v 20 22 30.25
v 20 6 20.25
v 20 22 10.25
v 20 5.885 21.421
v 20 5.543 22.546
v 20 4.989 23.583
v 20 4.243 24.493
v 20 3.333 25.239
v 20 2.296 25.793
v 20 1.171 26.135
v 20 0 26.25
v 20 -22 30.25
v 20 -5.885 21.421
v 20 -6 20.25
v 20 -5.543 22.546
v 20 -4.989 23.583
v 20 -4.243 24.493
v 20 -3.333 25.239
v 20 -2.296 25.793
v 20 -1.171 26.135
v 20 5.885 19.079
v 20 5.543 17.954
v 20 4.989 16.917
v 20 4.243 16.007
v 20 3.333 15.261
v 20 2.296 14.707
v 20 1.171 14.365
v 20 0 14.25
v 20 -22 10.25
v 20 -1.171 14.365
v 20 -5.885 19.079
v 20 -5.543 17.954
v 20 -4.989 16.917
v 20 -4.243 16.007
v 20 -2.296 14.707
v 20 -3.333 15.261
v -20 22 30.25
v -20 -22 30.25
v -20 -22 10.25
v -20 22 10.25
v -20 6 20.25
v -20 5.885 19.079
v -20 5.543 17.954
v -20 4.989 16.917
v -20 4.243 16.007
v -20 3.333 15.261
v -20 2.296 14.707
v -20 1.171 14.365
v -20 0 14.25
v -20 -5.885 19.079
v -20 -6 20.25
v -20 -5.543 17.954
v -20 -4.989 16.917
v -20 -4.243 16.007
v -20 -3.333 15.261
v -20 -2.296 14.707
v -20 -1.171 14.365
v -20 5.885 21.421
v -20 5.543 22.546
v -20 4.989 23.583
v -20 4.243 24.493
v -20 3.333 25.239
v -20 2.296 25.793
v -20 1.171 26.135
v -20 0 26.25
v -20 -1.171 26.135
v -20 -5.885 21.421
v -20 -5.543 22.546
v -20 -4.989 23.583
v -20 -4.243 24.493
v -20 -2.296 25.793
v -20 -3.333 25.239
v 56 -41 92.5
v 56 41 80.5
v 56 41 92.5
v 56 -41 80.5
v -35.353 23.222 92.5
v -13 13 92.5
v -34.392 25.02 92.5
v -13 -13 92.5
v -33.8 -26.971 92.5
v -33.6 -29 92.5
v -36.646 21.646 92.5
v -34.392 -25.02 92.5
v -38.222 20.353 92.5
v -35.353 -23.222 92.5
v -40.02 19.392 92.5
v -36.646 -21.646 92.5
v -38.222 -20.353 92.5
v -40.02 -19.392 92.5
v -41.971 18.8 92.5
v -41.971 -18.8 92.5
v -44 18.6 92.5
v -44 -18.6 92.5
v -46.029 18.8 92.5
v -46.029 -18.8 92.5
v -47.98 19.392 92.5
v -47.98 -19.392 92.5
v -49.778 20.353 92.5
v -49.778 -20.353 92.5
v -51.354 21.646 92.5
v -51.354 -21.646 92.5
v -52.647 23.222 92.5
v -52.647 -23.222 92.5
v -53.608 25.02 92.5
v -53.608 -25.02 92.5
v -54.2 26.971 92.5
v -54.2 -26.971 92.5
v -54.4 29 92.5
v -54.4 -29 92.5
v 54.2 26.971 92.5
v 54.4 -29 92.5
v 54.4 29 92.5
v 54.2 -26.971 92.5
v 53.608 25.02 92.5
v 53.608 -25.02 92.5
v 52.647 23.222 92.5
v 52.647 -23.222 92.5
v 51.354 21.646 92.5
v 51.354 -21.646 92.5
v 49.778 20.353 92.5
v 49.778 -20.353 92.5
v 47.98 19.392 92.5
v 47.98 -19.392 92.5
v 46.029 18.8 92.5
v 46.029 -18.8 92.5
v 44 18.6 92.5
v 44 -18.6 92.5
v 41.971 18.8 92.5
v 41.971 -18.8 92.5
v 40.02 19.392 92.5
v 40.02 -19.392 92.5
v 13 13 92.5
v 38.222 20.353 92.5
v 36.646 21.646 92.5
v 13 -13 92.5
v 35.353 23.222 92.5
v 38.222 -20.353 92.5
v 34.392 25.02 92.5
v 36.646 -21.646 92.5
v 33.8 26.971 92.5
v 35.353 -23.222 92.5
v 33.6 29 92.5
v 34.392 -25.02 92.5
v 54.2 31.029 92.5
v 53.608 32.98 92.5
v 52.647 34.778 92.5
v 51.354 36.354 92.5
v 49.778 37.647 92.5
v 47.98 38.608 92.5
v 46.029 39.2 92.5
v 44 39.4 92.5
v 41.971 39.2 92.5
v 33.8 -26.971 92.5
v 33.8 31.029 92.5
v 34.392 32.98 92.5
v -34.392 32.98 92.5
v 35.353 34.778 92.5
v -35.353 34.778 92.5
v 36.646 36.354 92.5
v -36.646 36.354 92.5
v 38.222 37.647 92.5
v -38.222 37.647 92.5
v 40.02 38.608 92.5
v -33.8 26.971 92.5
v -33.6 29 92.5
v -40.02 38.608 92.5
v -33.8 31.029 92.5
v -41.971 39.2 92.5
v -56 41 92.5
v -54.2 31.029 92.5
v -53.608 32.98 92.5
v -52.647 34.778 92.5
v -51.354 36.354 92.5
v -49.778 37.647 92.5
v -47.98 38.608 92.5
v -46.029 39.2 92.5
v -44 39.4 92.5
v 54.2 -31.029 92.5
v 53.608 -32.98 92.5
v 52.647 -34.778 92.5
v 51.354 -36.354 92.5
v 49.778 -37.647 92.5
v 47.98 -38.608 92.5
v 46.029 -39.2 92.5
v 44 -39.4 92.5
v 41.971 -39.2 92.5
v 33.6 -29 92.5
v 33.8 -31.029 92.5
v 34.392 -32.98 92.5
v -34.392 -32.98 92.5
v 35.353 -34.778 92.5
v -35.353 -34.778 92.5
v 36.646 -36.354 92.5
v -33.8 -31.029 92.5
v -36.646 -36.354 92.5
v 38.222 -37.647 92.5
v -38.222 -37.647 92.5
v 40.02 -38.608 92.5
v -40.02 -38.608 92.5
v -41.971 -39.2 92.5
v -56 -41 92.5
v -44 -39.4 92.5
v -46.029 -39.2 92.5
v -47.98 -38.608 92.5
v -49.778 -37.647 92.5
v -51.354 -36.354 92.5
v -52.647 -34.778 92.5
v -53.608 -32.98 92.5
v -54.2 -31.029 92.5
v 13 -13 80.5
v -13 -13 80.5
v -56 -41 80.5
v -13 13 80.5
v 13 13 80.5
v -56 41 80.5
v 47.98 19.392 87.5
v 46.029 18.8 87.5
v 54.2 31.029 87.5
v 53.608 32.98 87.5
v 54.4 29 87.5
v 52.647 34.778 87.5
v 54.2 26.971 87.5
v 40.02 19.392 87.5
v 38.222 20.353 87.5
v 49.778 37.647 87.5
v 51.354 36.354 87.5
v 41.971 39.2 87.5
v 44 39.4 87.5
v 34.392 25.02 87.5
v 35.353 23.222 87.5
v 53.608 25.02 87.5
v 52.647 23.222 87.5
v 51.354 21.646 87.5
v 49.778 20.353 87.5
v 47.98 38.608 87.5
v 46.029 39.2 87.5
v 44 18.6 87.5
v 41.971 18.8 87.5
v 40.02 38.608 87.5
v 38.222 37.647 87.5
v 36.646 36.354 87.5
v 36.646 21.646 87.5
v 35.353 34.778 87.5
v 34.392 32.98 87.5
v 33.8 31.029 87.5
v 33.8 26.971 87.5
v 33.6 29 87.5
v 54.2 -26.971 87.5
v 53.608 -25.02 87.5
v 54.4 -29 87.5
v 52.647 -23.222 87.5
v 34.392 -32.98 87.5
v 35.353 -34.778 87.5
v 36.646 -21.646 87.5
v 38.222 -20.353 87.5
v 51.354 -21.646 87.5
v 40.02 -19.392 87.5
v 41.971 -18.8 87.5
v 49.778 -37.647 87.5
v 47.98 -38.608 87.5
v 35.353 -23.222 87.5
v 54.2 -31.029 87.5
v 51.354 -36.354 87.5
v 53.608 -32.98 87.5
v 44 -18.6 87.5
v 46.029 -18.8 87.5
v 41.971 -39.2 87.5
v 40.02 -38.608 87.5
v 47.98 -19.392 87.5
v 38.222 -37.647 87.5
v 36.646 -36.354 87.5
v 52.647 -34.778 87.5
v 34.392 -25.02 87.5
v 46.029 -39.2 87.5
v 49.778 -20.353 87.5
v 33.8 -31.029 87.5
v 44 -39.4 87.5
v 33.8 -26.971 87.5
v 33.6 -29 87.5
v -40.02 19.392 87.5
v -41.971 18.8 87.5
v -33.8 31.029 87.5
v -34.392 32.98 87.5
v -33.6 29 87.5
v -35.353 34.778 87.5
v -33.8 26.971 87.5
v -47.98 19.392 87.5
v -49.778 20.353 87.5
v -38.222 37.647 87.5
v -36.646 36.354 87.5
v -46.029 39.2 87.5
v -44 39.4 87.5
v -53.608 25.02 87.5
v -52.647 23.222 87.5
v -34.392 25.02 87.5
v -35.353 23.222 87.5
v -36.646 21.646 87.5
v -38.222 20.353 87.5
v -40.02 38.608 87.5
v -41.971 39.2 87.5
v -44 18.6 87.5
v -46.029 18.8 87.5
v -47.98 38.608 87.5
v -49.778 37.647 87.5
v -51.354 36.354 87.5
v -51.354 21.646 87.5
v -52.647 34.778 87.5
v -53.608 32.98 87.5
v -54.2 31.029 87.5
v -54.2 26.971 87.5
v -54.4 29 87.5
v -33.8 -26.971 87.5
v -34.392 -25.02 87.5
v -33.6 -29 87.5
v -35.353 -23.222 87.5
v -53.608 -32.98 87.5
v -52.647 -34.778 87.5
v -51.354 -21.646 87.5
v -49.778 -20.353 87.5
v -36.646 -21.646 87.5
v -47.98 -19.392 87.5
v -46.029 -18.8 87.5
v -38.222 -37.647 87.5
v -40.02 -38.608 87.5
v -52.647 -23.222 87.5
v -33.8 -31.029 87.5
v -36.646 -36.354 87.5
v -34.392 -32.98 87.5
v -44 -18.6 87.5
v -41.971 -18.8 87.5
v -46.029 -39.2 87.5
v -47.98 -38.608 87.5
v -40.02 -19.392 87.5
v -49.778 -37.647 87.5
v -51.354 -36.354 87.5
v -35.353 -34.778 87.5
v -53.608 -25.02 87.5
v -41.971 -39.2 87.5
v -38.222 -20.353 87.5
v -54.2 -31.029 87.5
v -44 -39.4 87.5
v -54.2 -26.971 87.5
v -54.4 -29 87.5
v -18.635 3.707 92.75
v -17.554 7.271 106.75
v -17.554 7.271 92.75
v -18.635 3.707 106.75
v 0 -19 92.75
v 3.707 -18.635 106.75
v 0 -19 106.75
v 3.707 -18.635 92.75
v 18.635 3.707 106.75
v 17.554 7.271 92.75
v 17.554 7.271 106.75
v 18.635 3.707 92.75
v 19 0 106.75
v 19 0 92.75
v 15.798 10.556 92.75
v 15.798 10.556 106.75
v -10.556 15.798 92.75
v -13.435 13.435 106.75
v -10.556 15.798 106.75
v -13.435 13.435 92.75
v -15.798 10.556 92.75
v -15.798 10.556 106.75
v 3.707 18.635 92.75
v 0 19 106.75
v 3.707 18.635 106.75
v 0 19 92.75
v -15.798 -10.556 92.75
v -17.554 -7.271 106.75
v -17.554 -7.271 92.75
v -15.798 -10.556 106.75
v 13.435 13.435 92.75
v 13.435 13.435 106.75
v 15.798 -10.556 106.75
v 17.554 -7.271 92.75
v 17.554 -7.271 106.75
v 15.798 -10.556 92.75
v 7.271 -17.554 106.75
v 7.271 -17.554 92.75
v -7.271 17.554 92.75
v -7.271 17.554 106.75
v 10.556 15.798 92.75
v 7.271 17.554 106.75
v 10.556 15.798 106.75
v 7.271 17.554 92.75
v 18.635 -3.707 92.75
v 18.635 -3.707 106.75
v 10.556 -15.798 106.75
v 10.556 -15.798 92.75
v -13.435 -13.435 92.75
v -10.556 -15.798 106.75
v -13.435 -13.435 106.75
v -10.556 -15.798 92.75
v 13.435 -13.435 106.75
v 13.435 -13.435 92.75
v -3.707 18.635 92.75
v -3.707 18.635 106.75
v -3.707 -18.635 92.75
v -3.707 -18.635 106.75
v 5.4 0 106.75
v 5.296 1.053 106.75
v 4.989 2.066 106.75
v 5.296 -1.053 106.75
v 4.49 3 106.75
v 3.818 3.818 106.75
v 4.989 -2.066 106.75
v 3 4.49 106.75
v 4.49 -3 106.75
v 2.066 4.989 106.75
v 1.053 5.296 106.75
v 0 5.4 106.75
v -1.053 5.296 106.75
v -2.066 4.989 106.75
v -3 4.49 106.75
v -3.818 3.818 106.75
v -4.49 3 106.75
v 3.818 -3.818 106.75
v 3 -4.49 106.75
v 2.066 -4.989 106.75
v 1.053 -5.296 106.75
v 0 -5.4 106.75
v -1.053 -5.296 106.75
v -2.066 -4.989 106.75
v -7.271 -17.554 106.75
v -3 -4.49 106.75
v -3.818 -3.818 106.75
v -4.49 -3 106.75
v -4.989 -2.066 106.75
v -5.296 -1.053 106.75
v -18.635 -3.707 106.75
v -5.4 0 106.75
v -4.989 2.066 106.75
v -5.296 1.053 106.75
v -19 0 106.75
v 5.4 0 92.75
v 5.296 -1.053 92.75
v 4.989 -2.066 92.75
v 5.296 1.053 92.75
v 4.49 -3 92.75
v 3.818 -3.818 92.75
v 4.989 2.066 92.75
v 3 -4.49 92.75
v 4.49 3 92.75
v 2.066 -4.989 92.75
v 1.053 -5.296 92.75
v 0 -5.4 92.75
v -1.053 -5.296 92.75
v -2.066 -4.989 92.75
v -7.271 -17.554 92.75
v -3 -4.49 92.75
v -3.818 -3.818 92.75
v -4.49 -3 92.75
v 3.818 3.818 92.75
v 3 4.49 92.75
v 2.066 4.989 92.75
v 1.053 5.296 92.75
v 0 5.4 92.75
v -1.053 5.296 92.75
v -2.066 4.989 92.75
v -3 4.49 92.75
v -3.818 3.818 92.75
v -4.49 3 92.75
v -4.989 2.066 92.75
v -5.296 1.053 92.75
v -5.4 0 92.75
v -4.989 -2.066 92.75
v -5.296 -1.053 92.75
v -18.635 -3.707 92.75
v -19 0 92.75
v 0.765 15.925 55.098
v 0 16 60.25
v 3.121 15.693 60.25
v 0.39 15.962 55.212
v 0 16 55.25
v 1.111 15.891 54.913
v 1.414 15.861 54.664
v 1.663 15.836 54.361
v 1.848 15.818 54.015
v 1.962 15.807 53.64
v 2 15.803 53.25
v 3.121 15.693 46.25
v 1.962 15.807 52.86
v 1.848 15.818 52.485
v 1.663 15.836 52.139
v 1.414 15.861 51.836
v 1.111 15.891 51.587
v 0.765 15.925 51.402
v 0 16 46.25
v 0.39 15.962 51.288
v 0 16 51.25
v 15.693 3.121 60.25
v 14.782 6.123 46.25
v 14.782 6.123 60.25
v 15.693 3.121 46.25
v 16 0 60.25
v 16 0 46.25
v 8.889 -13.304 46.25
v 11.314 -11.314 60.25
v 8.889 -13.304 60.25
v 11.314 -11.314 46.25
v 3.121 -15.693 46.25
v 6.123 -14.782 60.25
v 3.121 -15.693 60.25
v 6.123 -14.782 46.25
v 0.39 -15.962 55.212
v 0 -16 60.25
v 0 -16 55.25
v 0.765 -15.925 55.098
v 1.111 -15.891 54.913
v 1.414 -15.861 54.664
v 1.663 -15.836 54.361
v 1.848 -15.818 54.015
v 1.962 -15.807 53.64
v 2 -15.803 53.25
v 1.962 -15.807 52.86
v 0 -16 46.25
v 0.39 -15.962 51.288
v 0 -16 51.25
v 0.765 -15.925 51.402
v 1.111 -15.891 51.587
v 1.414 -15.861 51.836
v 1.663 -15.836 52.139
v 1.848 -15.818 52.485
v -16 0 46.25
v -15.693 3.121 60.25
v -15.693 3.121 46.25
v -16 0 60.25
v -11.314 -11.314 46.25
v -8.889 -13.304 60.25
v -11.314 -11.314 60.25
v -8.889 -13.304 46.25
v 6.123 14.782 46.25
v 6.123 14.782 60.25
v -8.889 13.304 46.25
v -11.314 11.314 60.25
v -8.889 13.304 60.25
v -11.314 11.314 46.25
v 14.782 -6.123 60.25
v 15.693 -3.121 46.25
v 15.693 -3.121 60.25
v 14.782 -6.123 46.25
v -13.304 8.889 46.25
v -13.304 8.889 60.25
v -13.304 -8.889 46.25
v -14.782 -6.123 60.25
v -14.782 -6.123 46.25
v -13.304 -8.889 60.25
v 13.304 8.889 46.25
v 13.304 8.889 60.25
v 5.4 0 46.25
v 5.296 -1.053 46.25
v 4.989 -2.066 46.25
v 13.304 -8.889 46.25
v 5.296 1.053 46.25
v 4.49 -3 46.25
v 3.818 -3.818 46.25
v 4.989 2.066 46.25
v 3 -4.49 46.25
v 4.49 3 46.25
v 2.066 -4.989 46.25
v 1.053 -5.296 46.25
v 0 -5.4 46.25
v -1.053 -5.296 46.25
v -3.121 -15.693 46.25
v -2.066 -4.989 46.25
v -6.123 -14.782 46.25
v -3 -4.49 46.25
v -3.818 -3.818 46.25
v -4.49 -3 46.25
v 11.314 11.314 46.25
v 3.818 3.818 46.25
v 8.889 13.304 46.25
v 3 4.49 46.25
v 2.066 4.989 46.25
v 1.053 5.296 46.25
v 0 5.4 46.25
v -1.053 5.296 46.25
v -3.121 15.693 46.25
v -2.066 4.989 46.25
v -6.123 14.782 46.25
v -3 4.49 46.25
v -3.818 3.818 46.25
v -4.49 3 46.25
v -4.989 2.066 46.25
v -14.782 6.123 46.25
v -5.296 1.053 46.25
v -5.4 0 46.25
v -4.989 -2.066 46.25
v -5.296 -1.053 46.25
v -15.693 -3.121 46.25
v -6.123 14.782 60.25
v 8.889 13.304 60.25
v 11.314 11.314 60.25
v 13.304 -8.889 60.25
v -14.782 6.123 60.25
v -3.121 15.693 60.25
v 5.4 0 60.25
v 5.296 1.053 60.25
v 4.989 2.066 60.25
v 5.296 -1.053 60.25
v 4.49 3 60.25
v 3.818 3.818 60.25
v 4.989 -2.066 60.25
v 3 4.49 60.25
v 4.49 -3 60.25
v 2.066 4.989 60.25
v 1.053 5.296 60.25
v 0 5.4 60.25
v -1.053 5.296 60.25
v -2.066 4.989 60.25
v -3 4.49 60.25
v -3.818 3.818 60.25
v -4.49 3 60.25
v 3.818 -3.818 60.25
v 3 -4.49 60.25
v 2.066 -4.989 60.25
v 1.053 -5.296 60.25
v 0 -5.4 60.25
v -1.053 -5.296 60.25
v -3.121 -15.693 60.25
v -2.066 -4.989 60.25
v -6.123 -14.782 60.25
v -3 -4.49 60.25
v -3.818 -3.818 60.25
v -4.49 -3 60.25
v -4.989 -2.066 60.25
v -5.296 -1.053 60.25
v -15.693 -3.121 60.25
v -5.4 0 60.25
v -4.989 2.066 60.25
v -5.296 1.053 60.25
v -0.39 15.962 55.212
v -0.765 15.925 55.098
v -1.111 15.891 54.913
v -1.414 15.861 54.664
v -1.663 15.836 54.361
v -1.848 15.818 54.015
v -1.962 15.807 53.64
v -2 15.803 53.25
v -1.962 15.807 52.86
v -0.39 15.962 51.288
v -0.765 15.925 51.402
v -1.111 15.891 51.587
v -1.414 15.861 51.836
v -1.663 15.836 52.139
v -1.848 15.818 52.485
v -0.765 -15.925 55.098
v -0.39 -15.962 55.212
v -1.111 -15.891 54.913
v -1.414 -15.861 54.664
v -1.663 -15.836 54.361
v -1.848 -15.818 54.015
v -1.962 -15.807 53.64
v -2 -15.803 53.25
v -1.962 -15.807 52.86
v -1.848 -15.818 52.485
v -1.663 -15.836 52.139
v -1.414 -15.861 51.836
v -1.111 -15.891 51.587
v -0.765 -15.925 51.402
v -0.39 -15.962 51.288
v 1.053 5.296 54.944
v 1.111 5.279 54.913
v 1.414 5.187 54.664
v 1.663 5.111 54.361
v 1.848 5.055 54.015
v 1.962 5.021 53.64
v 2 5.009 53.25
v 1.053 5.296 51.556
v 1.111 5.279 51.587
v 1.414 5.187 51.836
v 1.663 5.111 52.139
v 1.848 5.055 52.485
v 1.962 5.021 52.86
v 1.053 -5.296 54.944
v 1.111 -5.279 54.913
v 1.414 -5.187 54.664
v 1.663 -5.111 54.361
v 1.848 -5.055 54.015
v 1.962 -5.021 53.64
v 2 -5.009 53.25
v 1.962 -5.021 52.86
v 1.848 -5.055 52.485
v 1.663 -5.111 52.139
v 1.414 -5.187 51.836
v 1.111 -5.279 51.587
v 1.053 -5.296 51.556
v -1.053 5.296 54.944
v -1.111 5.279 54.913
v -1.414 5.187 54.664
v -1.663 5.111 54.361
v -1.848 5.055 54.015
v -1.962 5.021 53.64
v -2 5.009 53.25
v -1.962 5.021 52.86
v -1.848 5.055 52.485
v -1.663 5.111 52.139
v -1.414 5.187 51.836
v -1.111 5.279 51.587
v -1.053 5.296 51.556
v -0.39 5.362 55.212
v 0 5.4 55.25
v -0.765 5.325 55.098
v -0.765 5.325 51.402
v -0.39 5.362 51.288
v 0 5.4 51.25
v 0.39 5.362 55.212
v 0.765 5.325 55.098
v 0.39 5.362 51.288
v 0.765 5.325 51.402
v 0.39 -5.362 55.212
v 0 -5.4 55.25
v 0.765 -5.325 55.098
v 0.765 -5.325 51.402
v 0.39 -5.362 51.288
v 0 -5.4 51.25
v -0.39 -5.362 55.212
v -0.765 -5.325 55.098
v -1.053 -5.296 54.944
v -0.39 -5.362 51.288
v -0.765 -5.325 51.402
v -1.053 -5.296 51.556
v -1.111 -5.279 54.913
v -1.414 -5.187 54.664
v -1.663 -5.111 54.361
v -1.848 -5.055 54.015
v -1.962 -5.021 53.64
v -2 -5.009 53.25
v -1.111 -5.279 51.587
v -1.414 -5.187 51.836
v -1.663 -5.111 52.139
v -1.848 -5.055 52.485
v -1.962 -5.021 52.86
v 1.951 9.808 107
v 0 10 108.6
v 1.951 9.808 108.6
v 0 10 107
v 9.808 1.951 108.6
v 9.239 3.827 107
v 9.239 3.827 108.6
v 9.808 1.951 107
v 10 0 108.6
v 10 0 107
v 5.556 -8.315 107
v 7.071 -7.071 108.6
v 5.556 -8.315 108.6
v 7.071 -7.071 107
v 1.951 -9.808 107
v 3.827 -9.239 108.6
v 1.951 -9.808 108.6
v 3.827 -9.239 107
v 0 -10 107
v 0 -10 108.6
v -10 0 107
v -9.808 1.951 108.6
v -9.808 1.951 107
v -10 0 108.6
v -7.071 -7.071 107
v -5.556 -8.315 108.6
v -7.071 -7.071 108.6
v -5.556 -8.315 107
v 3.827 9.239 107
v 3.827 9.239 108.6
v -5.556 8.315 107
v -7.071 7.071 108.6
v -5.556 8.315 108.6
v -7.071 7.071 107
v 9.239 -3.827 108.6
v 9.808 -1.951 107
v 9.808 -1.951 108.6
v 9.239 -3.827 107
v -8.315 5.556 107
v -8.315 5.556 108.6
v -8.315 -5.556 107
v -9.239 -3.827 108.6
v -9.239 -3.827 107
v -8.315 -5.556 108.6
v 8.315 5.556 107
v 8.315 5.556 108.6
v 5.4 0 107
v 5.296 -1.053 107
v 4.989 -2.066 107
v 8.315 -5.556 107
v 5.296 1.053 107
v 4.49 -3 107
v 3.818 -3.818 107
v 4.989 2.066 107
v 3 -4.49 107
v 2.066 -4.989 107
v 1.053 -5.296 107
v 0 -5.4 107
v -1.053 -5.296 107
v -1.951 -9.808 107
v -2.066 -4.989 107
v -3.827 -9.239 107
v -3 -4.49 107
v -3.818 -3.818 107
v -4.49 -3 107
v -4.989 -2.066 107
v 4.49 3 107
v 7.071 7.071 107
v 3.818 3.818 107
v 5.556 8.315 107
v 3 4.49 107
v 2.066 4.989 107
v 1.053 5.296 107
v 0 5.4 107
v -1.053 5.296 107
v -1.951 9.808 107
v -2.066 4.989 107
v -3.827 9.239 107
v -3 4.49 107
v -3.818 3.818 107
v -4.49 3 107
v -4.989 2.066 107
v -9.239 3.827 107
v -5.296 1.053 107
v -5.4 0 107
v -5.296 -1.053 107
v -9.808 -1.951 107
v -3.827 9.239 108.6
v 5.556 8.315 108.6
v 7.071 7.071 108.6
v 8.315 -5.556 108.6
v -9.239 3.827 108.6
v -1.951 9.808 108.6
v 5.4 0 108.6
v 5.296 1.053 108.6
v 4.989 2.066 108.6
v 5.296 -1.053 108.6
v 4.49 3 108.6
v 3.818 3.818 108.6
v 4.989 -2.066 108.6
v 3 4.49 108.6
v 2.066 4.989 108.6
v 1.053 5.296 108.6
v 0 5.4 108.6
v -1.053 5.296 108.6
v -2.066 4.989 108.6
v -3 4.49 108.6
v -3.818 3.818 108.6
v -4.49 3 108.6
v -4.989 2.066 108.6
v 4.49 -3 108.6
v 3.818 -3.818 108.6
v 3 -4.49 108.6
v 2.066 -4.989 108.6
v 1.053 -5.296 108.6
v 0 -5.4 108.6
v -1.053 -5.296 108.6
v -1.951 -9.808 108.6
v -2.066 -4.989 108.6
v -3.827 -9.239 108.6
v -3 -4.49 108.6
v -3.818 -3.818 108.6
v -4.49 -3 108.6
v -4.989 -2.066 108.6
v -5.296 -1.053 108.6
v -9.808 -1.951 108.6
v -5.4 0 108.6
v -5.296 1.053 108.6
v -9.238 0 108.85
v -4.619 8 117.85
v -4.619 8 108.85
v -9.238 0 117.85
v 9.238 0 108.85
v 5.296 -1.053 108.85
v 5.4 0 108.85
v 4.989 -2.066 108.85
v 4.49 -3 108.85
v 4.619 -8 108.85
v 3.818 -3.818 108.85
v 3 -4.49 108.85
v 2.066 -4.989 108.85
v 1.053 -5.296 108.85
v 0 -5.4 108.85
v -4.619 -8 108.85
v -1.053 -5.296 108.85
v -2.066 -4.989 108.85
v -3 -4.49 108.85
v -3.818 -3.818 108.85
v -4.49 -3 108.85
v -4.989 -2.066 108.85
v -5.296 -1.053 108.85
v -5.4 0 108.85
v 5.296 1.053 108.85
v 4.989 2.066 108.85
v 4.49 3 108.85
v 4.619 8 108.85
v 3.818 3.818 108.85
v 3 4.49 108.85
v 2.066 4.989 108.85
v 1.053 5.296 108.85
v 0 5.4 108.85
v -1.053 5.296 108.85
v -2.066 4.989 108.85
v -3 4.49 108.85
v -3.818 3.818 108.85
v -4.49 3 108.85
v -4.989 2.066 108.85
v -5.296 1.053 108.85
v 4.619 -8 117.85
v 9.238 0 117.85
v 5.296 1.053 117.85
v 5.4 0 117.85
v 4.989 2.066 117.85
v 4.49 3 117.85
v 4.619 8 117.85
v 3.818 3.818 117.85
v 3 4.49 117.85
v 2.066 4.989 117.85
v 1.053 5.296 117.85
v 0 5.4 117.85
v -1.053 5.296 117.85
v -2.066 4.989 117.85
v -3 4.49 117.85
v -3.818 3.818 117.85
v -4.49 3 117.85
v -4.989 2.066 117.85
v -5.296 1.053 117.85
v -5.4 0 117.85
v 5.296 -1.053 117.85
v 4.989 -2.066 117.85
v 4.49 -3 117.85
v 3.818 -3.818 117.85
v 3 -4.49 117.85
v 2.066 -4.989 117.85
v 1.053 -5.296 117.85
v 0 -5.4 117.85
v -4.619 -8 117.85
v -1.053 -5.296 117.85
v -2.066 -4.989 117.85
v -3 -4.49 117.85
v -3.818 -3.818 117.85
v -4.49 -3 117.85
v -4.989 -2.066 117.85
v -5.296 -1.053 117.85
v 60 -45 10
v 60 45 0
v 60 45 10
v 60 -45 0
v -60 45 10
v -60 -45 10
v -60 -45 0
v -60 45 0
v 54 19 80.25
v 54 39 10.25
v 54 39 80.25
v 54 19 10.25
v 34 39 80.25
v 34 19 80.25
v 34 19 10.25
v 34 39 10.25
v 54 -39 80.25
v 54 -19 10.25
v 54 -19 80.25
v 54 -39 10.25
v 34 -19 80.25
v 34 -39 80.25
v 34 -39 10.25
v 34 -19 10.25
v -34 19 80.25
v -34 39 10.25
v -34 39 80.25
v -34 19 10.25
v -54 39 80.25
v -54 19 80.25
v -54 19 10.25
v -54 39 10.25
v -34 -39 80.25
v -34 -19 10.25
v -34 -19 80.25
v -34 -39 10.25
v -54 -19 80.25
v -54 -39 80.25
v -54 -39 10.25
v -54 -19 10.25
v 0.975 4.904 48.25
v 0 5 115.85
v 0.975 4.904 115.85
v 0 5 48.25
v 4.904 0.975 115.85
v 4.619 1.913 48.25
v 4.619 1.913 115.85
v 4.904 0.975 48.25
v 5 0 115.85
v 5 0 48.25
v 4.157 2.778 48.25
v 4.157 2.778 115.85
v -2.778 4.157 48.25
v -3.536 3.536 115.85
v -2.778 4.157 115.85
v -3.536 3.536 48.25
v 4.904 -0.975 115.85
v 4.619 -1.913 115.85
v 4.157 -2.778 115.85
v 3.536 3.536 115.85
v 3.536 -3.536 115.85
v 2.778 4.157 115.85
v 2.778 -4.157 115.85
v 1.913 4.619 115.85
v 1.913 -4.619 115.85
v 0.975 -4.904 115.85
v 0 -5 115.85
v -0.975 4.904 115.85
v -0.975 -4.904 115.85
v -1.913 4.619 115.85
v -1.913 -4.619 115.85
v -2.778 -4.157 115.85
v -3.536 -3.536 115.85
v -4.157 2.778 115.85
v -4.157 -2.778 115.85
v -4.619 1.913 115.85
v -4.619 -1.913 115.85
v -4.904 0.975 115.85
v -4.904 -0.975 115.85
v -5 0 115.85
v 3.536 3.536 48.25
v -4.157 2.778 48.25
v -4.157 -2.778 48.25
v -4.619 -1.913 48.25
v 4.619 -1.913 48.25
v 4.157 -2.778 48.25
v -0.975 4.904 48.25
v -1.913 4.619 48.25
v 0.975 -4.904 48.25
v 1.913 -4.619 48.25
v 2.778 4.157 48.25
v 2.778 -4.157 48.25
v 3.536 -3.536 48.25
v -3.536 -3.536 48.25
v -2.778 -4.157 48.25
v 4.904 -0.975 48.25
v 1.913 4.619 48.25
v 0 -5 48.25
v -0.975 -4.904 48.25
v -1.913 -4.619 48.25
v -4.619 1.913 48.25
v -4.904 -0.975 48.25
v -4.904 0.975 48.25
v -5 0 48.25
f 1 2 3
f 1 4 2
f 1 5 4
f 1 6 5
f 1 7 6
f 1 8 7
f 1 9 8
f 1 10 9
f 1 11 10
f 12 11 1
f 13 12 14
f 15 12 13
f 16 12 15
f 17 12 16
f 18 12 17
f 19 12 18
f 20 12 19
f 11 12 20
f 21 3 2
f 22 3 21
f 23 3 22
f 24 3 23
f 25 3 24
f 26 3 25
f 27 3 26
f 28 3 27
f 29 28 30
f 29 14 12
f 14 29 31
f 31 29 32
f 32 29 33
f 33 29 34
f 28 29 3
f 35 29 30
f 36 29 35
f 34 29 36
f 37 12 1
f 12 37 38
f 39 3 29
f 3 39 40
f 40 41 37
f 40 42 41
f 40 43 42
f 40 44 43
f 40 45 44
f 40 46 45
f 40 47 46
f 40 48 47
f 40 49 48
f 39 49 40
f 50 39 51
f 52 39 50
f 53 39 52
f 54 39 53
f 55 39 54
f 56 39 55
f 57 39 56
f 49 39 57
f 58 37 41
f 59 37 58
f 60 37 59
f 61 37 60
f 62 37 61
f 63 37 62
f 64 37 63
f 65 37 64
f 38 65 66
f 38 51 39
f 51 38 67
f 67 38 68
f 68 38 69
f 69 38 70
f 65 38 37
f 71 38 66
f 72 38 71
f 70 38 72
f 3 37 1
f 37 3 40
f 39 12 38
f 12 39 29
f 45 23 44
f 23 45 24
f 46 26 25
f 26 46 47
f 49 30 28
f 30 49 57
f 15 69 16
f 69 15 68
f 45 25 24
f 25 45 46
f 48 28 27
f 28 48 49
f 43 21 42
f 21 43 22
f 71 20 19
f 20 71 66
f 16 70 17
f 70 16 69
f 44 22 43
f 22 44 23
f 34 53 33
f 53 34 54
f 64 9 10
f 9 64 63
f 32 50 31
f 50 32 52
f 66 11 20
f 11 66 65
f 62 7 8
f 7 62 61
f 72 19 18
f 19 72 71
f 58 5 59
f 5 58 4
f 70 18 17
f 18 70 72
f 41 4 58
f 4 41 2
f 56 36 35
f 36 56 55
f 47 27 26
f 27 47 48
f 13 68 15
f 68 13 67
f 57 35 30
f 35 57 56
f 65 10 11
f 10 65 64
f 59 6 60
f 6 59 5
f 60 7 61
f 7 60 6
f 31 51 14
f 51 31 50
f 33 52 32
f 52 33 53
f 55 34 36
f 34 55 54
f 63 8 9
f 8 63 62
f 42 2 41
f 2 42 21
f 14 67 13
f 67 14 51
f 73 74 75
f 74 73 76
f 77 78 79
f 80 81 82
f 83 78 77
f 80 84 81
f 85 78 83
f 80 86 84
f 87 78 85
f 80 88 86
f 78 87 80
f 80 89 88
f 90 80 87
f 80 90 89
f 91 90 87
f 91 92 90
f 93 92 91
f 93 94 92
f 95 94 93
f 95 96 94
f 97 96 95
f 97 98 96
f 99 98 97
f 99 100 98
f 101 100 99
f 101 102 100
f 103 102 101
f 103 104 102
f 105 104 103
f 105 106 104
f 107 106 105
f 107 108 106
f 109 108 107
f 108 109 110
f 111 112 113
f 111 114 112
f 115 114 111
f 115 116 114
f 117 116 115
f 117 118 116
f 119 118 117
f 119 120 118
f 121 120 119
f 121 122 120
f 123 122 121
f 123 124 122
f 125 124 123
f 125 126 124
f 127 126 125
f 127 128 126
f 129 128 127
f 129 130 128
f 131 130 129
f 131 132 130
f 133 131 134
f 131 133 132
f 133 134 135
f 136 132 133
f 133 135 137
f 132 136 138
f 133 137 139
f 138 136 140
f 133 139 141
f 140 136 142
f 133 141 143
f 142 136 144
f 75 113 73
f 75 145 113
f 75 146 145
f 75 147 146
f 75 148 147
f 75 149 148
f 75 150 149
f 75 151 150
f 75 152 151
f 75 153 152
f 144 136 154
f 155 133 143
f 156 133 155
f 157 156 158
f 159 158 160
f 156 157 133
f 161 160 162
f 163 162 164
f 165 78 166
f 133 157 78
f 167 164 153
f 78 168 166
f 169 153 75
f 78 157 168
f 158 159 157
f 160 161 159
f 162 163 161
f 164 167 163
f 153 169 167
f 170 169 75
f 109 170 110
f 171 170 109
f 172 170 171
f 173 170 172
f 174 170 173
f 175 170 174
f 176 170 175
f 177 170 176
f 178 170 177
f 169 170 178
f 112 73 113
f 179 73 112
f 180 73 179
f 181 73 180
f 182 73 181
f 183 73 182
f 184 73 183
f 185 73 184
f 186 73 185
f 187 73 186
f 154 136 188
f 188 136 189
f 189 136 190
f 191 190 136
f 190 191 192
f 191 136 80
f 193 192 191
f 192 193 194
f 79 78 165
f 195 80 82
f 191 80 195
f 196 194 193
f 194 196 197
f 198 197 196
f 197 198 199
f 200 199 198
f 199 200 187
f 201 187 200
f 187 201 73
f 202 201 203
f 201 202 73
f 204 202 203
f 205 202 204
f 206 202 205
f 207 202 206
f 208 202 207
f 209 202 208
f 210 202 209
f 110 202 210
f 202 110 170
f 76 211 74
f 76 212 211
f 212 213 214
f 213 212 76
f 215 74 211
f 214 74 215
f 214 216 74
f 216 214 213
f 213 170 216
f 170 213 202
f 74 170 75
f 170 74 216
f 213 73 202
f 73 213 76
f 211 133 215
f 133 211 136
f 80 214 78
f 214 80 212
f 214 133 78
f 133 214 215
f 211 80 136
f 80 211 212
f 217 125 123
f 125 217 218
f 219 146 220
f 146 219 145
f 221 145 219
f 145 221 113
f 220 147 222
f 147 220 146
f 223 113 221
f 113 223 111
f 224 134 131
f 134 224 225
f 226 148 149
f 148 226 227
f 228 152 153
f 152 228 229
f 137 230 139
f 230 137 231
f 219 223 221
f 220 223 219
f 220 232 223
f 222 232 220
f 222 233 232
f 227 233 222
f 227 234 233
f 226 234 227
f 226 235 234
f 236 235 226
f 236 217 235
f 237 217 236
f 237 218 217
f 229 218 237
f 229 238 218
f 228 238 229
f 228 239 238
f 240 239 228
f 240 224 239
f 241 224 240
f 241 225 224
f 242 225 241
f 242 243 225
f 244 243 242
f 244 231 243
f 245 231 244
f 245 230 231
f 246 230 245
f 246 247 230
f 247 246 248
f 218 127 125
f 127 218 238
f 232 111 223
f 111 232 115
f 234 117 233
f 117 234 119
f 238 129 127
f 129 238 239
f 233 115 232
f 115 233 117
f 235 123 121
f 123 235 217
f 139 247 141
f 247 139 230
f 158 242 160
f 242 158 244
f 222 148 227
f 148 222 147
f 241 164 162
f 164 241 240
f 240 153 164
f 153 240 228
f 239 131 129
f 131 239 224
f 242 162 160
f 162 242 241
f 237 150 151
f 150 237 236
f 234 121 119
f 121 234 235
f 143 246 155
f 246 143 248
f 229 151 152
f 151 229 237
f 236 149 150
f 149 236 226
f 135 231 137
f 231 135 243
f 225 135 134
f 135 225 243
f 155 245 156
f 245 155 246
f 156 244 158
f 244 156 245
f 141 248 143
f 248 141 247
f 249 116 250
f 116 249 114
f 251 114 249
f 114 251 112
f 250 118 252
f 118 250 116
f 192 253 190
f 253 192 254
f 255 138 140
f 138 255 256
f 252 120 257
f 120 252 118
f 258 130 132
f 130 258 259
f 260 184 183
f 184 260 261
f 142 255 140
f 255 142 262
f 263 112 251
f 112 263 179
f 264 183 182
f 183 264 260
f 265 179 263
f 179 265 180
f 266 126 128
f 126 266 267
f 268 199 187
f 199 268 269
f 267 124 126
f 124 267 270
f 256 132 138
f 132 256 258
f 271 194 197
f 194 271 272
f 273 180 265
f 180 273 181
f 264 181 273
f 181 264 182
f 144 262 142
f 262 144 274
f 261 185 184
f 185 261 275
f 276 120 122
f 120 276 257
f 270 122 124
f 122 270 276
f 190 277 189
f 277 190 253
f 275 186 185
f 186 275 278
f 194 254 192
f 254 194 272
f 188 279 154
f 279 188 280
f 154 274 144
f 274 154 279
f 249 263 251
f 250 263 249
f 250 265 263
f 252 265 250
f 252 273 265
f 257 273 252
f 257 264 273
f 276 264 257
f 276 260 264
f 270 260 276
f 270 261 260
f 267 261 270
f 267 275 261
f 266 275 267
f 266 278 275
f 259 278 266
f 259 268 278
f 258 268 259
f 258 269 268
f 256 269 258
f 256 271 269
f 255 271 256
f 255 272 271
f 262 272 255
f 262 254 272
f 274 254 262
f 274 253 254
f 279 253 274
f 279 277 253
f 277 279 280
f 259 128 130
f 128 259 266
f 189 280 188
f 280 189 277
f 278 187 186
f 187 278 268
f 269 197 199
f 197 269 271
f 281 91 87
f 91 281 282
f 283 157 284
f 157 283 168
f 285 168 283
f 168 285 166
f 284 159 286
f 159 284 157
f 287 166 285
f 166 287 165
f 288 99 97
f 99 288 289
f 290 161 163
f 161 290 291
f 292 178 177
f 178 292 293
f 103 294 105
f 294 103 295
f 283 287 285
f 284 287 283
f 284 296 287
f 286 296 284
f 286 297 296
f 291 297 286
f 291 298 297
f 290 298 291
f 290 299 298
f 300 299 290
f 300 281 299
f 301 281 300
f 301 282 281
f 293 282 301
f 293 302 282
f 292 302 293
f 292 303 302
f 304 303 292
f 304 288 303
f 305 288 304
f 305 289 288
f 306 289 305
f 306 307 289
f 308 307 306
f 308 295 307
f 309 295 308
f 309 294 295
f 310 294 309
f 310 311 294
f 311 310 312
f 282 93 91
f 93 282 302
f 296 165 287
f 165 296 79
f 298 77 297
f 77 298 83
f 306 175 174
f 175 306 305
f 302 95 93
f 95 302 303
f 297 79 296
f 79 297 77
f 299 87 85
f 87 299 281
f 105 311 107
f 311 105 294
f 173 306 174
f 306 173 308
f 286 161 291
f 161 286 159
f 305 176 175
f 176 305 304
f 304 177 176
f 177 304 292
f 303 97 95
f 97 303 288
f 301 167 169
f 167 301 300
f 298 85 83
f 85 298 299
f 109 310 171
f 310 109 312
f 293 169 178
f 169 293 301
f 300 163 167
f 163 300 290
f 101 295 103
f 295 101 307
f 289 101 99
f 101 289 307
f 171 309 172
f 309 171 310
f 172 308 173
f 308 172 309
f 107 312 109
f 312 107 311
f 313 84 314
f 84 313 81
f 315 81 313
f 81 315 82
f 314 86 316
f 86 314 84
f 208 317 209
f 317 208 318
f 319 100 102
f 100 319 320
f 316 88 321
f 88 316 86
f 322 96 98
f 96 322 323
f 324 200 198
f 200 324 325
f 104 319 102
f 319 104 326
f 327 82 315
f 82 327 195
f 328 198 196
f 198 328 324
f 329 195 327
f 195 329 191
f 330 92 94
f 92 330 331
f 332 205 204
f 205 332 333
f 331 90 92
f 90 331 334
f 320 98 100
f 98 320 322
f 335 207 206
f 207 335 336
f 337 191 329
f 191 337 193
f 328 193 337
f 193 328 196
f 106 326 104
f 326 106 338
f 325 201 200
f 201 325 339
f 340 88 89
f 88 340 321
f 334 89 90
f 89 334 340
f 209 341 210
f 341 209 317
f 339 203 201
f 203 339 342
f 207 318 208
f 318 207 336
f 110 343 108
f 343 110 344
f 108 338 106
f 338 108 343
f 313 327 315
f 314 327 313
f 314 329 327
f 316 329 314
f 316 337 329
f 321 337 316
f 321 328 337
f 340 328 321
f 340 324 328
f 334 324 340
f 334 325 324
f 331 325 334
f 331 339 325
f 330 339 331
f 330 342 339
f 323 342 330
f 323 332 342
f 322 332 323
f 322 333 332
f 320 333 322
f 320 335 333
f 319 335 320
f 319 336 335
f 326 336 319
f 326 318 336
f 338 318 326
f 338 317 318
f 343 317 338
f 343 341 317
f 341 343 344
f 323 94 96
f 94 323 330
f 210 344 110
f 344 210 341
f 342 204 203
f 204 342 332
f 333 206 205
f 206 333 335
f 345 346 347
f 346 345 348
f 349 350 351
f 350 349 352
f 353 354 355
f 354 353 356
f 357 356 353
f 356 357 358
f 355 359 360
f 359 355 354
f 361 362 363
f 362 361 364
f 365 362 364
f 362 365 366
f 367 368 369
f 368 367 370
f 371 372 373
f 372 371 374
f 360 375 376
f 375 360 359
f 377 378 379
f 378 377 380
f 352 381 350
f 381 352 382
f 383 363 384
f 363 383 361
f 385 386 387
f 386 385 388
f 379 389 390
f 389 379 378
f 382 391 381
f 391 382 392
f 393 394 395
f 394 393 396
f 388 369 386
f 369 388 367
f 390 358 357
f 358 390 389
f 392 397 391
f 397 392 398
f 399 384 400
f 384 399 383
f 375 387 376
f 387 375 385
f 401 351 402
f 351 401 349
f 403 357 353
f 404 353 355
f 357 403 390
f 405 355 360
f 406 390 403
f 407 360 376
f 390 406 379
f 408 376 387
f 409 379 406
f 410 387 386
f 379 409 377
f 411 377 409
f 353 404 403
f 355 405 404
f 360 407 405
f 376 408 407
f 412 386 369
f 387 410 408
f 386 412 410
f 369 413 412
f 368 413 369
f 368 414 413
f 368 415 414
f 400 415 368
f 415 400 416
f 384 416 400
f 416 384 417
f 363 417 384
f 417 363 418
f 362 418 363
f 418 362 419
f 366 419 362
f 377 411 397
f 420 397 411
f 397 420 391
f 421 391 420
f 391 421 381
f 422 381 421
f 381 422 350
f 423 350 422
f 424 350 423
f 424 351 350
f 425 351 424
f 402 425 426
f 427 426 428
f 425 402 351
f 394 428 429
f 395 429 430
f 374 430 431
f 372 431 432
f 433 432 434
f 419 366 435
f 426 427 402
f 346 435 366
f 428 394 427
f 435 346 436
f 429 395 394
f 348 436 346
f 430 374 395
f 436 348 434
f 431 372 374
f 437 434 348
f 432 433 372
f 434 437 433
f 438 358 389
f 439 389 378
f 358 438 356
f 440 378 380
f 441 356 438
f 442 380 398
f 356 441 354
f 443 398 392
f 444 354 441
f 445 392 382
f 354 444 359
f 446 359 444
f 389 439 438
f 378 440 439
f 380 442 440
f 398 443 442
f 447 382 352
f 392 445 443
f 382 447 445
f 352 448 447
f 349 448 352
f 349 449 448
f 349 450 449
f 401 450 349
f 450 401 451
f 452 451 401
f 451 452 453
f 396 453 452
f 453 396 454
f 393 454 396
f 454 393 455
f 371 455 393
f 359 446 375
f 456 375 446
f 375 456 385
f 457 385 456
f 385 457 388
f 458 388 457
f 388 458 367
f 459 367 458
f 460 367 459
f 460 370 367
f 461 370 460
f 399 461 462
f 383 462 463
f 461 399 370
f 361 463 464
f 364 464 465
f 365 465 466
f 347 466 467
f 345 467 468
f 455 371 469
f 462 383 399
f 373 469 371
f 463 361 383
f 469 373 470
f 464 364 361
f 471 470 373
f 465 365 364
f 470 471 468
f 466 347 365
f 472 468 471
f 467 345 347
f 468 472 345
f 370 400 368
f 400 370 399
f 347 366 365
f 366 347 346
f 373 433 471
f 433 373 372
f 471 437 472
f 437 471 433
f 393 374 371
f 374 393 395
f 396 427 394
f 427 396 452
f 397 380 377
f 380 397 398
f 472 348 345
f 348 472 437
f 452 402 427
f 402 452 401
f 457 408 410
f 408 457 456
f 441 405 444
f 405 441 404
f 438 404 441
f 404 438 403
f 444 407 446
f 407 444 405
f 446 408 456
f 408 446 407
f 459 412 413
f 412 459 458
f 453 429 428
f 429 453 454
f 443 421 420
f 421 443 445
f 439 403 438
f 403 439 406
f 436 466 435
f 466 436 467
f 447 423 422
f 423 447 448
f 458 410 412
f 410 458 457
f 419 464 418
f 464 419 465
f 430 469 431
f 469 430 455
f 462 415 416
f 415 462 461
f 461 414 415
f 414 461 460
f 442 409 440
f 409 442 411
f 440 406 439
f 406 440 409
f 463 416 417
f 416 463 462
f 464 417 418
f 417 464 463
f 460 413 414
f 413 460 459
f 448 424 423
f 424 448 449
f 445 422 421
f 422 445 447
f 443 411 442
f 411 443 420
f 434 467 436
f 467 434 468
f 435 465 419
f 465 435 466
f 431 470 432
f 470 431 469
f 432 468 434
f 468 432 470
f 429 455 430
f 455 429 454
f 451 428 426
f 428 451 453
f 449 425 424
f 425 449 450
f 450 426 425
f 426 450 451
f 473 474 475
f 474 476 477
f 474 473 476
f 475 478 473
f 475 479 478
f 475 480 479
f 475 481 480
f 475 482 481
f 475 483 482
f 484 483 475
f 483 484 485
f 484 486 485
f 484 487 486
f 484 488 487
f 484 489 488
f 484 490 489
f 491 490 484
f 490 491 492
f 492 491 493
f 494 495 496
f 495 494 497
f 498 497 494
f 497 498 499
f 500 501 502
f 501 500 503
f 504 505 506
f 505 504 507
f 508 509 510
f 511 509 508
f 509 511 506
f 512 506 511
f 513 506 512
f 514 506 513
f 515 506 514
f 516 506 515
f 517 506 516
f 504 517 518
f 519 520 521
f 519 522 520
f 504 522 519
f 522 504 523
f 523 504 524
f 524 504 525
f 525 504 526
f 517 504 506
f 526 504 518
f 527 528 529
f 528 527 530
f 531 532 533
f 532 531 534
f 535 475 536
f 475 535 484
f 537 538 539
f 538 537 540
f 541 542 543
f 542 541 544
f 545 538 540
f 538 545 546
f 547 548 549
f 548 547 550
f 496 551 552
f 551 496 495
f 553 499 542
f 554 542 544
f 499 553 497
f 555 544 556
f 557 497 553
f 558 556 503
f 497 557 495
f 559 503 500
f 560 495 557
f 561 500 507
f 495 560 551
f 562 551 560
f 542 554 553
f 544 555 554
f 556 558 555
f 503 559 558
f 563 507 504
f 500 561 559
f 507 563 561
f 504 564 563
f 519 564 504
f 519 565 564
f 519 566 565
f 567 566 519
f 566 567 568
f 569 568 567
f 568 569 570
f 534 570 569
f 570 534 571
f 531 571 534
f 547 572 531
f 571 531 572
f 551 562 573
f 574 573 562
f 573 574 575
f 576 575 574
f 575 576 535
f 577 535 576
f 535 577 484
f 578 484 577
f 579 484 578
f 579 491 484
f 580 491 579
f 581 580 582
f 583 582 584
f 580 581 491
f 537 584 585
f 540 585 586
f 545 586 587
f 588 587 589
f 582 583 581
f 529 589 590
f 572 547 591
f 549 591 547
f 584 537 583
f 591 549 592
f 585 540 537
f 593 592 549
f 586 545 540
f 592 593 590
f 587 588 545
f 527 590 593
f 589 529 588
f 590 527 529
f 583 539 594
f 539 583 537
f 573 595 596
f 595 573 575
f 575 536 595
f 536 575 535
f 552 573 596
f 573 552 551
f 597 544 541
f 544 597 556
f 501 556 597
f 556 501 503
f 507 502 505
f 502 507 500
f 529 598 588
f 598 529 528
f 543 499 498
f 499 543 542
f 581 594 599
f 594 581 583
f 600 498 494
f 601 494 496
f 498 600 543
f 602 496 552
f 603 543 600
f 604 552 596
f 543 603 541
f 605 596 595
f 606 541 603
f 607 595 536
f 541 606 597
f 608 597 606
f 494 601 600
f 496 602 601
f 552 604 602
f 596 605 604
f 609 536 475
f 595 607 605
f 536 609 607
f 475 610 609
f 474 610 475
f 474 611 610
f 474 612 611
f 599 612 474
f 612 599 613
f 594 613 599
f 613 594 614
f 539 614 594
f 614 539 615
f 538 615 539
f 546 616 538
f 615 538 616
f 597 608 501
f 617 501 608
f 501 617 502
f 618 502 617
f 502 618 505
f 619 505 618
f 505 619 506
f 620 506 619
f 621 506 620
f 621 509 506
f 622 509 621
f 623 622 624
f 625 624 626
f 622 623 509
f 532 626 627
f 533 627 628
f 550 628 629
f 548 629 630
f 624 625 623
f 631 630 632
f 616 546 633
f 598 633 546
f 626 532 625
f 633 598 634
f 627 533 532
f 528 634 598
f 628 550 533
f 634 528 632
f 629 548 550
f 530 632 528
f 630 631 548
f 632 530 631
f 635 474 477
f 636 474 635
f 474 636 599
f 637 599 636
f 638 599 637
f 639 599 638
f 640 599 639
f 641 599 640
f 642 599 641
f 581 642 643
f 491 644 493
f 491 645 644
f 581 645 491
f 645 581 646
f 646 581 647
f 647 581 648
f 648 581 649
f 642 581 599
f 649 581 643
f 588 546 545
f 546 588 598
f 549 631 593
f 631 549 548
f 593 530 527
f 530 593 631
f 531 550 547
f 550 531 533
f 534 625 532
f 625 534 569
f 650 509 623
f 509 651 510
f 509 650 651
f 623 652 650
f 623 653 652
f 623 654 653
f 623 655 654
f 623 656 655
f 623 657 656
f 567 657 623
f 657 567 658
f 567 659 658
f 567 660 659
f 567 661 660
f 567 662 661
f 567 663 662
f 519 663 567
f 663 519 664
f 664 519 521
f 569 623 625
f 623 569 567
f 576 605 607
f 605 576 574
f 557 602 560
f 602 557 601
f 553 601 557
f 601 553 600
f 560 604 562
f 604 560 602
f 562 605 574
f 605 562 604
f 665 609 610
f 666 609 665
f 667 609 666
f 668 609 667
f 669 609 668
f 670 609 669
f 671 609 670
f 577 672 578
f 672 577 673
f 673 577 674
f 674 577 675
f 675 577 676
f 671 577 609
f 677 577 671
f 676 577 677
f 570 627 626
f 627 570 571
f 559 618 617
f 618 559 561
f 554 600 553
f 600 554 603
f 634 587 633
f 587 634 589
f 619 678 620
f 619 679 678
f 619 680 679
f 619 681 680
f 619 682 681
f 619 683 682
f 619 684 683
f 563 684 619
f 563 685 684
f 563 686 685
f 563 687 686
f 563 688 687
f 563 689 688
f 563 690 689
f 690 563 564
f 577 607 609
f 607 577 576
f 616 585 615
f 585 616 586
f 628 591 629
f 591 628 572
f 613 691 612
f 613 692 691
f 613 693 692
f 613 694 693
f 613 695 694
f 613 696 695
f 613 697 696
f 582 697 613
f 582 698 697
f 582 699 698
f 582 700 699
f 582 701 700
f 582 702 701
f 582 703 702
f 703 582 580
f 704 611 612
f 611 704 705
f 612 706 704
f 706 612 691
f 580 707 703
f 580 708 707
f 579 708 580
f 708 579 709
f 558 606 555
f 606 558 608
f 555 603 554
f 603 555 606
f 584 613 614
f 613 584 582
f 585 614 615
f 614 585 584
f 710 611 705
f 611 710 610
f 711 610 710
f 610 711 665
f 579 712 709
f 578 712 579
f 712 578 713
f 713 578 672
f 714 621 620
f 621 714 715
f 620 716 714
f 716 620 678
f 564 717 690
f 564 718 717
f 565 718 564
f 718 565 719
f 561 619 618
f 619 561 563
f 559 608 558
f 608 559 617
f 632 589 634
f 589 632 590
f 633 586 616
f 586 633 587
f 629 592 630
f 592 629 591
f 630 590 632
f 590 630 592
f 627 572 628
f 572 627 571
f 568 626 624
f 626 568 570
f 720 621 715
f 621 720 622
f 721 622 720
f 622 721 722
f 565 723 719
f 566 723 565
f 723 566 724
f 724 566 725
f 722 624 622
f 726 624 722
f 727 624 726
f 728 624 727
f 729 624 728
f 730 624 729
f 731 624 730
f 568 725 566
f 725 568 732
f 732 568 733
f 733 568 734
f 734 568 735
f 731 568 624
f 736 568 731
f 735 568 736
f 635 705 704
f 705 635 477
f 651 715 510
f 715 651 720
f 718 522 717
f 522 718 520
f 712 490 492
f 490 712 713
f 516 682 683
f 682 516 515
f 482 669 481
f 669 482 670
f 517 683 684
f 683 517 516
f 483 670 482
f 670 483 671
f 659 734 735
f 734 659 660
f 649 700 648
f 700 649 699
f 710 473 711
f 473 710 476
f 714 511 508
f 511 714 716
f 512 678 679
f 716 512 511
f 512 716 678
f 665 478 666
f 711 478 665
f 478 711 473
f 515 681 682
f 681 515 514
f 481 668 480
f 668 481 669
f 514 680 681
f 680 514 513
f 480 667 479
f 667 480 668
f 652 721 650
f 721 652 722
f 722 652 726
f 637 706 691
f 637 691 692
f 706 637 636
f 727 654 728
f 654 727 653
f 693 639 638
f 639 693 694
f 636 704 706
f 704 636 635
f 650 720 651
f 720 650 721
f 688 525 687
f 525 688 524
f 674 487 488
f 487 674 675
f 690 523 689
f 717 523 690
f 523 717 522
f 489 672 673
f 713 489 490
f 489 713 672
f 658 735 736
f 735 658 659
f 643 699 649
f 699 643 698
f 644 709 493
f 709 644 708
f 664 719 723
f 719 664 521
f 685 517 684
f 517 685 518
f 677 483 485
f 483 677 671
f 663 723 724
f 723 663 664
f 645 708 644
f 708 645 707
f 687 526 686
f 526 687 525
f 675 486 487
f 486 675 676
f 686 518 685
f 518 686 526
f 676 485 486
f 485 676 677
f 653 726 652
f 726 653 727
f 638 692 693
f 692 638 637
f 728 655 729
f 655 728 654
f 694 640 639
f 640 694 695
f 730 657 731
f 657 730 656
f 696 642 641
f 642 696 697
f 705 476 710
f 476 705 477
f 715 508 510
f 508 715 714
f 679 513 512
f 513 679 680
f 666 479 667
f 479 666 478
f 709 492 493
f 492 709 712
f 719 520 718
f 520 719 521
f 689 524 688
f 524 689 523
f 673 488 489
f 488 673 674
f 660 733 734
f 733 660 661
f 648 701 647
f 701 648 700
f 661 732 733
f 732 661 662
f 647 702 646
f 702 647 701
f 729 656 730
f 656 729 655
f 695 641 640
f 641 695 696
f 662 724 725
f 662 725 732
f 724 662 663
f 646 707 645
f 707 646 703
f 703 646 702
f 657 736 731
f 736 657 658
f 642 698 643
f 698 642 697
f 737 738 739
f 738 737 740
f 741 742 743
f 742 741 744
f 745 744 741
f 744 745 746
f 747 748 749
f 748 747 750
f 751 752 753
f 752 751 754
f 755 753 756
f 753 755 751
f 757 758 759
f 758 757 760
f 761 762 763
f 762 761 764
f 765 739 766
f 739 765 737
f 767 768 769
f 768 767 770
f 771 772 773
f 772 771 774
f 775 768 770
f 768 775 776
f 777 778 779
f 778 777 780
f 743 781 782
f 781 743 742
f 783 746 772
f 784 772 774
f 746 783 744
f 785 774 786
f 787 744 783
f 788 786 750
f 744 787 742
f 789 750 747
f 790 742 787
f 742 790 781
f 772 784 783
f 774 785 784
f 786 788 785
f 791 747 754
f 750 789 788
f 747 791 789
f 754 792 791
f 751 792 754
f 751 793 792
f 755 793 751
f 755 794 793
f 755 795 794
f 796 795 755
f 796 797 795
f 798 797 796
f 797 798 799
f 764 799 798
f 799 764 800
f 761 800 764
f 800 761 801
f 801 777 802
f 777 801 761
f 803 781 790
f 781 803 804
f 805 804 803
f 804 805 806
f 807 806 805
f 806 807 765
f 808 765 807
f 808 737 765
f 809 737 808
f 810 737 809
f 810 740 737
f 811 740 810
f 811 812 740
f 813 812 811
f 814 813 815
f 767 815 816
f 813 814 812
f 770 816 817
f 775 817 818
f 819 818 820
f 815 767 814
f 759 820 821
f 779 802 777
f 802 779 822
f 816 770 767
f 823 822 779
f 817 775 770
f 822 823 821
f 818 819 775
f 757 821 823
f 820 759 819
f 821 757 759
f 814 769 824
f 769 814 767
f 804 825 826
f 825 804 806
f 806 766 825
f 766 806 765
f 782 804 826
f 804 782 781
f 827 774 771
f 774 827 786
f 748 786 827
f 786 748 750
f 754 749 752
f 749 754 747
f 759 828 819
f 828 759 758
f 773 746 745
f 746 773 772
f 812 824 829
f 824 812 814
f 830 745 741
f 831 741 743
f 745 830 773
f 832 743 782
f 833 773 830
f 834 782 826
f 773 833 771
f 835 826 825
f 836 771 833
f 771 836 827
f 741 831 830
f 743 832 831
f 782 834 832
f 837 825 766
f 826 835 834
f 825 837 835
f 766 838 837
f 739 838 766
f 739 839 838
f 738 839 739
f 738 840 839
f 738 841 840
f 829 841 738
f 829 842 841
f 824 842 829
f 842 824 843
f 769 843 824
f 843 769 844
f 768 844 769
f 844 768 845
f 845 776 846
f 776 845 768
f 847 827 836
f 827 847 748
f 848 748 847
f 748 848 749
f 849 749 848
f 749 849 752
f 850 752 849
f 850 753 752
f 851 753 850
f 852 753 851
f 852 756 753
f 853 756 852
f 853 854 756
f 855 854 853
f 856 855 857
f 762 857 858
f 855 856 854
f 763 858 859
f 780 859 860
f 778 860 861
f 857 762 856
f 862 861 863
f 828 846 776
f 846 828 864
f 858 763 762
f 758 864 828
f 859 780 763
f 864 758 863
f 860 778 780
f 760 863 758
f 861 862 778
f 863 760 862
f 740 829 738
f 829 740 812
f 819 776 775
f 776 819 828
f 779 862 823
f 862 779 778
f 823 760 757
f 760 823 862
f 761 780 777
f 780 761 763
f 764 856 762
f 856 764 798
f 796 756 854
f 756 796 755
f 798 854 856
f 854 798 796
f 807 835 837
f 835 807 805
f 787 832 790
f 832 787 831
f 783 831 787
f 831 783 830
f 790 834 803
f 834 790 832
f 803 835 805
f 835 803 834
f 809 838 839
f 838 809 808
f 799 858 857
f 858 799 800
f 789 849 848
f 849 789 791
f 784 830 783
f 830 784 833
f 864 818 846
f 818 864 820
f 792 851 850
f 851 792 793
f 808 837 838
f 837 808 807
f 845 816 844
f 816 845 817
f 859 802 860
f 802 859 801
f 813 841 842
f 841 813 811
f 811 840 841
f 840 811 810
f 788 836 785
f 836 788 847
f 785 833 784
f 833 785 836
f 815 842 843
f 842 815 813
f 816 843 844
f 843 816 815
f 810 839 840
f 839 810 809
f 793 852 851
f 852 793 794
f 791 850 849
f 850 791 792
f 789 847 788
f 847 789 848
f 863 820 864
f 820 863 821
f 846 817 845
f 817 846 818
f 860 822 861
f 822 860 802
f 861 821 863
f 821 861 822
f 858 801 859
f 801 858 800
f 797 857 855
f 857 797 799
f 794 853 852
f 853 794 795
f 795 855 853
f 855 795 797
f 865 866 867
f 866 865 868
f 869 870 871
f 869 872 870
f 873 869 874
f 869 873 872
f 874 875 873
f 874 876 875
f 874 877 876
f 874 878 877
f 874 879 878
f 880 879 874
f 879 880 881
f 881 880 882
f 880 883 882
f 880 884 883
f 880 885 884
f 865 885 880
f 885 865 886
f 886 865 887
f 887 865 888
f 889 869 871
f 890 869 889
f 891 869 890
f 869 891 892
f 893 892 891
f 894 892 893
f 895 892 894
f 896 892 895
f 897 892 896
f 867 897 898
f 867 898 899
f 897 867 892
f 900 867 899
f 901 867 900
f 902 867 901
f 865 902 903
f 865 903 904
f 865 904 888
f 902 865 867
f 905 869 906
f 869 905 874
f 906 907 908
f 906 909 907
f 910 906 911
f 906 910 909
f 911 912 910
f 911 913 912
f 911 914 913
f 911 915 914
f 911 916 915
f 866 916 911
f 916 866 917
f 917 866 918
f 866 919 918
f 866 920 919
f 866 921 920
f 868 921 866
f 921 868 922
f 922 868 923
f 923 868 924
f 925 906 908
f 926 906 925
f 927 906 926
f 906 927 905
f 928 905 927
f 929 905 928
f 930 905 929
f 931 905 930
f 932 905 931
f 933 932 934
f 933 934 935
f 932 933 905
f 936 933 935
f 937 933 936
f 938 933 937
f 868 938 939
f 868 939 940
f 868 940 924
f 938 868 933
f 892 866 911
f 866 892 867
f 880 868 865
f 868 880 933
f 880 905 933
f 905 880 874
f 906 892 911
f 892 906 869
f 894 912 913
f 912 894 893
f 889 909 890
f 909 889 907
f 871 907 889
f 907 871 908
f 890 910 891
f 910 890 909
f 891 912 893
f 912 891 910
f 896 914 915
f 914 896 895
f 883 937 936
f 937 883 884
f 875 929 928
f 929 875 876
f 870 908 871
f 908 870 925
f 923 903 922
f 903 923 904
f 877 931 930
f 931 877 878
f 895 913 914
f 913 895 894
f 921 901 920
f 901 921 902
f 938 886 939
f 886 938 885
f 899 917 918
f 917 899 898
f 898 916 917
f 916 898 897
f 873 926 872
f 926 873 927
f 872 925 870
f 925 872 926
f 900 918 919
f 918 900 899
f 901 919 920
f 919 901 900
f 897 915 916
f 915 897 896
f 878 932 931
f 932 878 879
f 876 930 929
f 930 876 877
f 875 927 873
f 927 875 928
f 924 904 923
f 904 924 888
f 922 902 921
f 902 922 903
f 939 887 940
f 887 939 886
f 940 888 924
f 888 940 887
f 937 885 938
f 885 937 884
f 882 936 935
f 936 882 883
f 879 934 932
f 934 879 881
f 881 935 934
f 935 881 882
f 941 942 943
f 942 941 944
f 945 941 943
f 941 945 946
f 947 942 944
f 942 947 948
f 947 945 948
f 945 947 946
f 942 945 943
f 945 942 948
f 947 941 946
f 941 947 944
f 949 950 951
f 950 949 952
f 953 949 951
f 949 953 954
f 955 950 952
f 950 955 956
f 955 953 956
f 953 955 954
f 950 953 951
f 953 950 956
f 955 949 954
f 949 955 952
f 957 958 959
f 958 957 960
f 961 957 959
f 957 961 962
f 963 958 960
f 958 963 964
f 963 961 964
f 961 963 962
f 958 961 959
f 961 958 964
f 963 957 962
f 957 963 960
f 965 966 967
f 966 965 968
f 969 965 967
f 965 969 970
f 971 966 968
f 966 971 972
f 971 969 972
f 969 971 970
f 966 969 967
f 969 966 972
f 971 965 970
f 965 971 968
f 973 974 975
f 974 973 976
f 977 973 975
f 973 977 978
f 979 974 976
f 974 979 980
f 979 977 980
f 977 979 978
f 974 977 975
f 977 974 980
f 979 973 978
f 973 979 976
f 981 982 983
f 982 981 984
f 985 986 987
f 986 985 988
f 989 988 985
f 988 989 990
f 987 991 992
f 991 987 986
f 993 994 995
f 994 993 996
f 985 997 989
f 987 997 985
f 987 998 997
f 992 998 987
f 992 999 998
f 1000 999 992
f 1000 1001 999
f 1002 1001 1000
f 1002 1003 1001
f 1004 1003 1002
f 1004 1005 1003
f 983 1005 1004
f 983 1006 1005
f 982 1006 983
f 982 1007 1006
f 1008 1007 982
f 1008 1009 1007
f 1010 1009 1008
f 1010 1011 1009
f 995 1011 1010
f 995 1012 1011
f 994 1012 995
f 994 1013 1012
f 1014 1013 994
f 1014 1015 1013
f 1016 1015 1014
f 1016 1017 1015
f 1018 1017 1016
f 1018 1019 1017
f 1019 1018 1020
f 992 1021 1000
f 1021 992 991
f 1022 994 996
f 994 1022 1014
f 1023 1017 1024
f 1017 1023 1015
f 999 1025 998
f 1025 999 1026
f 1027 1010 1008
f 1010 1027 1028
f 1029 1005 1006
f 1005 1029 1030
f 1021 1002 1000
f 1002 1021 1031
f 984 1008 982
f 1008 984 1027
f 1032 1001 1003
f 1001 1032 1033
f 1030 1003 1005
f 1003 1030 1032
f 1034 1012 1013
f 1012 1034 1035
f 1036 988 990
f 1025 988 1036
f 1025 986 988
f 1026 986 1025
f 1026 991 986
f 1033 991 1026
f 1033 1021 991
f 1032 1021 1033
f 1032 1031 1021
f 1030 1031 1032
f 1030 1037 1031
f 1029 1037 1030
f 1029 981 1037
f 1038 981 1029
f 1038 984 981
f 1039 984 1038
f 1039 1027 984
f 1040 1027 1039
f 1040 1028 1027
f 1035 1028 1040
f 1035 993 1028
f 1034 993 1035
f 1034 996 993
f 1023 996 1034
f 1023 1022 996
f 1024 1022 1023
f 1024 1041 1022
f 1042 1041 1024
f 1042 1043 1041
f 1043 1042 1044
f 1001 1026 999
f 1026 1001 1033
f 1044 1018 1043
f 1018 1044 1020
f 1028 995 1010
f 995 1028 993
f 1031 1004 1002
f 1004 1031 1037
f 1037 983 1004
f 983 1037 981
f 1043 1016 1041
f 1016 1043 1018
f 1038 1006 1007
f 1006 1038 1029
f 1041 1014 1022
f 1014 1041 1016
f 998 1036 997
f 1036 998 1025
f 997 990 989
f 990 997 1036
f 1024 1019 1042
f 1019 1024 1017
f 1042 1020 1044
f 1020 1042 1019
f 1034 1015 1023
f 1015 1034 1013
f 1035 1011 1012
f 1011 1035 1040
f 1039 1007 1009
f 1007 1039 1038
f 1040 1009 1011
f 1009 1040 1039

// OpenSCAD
$fn = 32;

// ------------------------------------------------------------------------
// Arbor press fixture: screw d10, posts 70 mm, gap 16 mm
// Every part is its own module, assembly() places every instance.
// ------------------------------------------------------------------------

// --- part 1 ---
module press_bed() {
  difference() {
    translate([-60, -45, 0]) cube([120, 90, 10]);
  }
}

// --- part 2 ---
module anvil_block() {
  difference() {
    translate([-20, -22, 0]) cube([40, 44, 20]);
    translate([0, 0, 10]) rotate([0, 90, 0]) cylinder(h = 42, d = 12, center = true);
  }
}

// --- part 3 ---
module press_post_a() {
  translate([-10, -10, 0]) cube([20, 20, 70]);
}

// --- part 4 ---
module press_post_b() {
  translate([-10, -10, 0]) cube([20, 20, 70]);
}

// --- part 5 ---
module press_post_c() {
  translate([-10, -10, 0]) cube([20, 20, 70]);
}

// --- part 6 ---
module press_post_d() {
  translate([-10, -10, 0]) cube([20, 20, 70]);
}

// --- part 7 ---
module press_frame() {
  difference() {
    translate([-56, -41, 0]) cube([112, 82, 12]);
    translate([-13, -13, -1]) cube([26, 26, 14]);
    translate([44, 29, 7]) cylinder(h = 6, d = 20.8);
    translate([44, -29, 7]) cylinder(h = 6, d = 20.8);
    translate([-44, 29, 7]) cylinder(h = 6, d = 20.8);
    translate([-44, -29, 7]) cylinder(h = 6, d = 20.8);
  }
}

// --- part 8 ---
module guide_ring() {
  difference() {
      translate([0, 0, 0]) cylinder(h = 14, d = 38);
      translate([0, 0, -1]) cylinder(h = 16, d = 10.8);
    }
}

// --- part 9 ---
module press_screw() {
  translate([0, 0, -33.8]) cylinder(h = 67.6, d = 10);
}

// --- part 10 ---
module press_head() {
  difference() {
    cylinder(h = 14, d = 32);
    translate([0, 0, -1]) cylinder(h = 16, d = 10.8);
    translate([0, 0, 7]) rotate([90, 0, 0]) cylinder(h = 34, d = 4, center = true);
  }
}

// --- part 11 ---
module nut_washer() {
  difference() {
      translate([0, 0, 0]) cylinder(h = 1.6, d = 20);
      translate([0, 0, -1]) cylinder(h = 3.6, d = 10.8);
    }
}

// --- part 12 ---
module press_nut() {
  difference() {
    linear_extrude(height = 9) polygon(points = [[9.238, 0], [4.619, 8], [-4.619, 8], [-9.238, 0], [-4.619, -8], [4.619, -8]]);
    translate([0, 0, -1]) cylinder(h = 11, d = 10.8);
  }
}

// --- assembly ---
module assembly() {
  color([0.80, 0.24, 0.20]) translate([0, 0, 0]) rotate([0, 0, 0]) press_bed();
  color([0.20, 0.45, 0.75]) translate([0, 0, 10.25]) rotate([0, 0, 0]) anvil_block();
  color([0.25, 0.62, 0.32]) translate([44, 29, 10.25]) rotate([0, 0, 0]) press_post_a();
  color([0.92, 0.70, 0.18]) translate([44, -29, 10.25]) rotate([0, 0, 0]) press_post_b();
  color([0.58, 0.35, 0.70]) translate([-44, 29, 10.25]) rotate([0, 0, 0]) press_post_c();
  color([0.16, 0.66, 0.66]) translate([-44, -29, 10.25]) rotate([0, 0, 0]) press_post_d();
  color([0.85, 0.48, 0.18]) translate([0, 0, 80.5]) rotate([0, 0, 0]) press_frame();
  color([0.55, 0.60, 0.65]) translate([0, 0, 92.75]) rotate([0, 0, 0]) guide_ring();
  color([0.75, 0.30, 0.55]) translate([0, 0, 82.05]) rotate([0, 0, 0]) press_screw();
  color([0.42, 0.52, 0.28]) translate([0, 0, 46.25]) rotate([0, 0, 0]) press_head();
  color([0.80, 0.24, 0.20]) translate([0, 0, 107]) rotate([0, 0, 0]) nut_washer();
  color([0.20, 0.45, 0.75]) translate([0, 0, 108.85]) rotate([0, 0, 0]) press_nut();
}

assembly();
